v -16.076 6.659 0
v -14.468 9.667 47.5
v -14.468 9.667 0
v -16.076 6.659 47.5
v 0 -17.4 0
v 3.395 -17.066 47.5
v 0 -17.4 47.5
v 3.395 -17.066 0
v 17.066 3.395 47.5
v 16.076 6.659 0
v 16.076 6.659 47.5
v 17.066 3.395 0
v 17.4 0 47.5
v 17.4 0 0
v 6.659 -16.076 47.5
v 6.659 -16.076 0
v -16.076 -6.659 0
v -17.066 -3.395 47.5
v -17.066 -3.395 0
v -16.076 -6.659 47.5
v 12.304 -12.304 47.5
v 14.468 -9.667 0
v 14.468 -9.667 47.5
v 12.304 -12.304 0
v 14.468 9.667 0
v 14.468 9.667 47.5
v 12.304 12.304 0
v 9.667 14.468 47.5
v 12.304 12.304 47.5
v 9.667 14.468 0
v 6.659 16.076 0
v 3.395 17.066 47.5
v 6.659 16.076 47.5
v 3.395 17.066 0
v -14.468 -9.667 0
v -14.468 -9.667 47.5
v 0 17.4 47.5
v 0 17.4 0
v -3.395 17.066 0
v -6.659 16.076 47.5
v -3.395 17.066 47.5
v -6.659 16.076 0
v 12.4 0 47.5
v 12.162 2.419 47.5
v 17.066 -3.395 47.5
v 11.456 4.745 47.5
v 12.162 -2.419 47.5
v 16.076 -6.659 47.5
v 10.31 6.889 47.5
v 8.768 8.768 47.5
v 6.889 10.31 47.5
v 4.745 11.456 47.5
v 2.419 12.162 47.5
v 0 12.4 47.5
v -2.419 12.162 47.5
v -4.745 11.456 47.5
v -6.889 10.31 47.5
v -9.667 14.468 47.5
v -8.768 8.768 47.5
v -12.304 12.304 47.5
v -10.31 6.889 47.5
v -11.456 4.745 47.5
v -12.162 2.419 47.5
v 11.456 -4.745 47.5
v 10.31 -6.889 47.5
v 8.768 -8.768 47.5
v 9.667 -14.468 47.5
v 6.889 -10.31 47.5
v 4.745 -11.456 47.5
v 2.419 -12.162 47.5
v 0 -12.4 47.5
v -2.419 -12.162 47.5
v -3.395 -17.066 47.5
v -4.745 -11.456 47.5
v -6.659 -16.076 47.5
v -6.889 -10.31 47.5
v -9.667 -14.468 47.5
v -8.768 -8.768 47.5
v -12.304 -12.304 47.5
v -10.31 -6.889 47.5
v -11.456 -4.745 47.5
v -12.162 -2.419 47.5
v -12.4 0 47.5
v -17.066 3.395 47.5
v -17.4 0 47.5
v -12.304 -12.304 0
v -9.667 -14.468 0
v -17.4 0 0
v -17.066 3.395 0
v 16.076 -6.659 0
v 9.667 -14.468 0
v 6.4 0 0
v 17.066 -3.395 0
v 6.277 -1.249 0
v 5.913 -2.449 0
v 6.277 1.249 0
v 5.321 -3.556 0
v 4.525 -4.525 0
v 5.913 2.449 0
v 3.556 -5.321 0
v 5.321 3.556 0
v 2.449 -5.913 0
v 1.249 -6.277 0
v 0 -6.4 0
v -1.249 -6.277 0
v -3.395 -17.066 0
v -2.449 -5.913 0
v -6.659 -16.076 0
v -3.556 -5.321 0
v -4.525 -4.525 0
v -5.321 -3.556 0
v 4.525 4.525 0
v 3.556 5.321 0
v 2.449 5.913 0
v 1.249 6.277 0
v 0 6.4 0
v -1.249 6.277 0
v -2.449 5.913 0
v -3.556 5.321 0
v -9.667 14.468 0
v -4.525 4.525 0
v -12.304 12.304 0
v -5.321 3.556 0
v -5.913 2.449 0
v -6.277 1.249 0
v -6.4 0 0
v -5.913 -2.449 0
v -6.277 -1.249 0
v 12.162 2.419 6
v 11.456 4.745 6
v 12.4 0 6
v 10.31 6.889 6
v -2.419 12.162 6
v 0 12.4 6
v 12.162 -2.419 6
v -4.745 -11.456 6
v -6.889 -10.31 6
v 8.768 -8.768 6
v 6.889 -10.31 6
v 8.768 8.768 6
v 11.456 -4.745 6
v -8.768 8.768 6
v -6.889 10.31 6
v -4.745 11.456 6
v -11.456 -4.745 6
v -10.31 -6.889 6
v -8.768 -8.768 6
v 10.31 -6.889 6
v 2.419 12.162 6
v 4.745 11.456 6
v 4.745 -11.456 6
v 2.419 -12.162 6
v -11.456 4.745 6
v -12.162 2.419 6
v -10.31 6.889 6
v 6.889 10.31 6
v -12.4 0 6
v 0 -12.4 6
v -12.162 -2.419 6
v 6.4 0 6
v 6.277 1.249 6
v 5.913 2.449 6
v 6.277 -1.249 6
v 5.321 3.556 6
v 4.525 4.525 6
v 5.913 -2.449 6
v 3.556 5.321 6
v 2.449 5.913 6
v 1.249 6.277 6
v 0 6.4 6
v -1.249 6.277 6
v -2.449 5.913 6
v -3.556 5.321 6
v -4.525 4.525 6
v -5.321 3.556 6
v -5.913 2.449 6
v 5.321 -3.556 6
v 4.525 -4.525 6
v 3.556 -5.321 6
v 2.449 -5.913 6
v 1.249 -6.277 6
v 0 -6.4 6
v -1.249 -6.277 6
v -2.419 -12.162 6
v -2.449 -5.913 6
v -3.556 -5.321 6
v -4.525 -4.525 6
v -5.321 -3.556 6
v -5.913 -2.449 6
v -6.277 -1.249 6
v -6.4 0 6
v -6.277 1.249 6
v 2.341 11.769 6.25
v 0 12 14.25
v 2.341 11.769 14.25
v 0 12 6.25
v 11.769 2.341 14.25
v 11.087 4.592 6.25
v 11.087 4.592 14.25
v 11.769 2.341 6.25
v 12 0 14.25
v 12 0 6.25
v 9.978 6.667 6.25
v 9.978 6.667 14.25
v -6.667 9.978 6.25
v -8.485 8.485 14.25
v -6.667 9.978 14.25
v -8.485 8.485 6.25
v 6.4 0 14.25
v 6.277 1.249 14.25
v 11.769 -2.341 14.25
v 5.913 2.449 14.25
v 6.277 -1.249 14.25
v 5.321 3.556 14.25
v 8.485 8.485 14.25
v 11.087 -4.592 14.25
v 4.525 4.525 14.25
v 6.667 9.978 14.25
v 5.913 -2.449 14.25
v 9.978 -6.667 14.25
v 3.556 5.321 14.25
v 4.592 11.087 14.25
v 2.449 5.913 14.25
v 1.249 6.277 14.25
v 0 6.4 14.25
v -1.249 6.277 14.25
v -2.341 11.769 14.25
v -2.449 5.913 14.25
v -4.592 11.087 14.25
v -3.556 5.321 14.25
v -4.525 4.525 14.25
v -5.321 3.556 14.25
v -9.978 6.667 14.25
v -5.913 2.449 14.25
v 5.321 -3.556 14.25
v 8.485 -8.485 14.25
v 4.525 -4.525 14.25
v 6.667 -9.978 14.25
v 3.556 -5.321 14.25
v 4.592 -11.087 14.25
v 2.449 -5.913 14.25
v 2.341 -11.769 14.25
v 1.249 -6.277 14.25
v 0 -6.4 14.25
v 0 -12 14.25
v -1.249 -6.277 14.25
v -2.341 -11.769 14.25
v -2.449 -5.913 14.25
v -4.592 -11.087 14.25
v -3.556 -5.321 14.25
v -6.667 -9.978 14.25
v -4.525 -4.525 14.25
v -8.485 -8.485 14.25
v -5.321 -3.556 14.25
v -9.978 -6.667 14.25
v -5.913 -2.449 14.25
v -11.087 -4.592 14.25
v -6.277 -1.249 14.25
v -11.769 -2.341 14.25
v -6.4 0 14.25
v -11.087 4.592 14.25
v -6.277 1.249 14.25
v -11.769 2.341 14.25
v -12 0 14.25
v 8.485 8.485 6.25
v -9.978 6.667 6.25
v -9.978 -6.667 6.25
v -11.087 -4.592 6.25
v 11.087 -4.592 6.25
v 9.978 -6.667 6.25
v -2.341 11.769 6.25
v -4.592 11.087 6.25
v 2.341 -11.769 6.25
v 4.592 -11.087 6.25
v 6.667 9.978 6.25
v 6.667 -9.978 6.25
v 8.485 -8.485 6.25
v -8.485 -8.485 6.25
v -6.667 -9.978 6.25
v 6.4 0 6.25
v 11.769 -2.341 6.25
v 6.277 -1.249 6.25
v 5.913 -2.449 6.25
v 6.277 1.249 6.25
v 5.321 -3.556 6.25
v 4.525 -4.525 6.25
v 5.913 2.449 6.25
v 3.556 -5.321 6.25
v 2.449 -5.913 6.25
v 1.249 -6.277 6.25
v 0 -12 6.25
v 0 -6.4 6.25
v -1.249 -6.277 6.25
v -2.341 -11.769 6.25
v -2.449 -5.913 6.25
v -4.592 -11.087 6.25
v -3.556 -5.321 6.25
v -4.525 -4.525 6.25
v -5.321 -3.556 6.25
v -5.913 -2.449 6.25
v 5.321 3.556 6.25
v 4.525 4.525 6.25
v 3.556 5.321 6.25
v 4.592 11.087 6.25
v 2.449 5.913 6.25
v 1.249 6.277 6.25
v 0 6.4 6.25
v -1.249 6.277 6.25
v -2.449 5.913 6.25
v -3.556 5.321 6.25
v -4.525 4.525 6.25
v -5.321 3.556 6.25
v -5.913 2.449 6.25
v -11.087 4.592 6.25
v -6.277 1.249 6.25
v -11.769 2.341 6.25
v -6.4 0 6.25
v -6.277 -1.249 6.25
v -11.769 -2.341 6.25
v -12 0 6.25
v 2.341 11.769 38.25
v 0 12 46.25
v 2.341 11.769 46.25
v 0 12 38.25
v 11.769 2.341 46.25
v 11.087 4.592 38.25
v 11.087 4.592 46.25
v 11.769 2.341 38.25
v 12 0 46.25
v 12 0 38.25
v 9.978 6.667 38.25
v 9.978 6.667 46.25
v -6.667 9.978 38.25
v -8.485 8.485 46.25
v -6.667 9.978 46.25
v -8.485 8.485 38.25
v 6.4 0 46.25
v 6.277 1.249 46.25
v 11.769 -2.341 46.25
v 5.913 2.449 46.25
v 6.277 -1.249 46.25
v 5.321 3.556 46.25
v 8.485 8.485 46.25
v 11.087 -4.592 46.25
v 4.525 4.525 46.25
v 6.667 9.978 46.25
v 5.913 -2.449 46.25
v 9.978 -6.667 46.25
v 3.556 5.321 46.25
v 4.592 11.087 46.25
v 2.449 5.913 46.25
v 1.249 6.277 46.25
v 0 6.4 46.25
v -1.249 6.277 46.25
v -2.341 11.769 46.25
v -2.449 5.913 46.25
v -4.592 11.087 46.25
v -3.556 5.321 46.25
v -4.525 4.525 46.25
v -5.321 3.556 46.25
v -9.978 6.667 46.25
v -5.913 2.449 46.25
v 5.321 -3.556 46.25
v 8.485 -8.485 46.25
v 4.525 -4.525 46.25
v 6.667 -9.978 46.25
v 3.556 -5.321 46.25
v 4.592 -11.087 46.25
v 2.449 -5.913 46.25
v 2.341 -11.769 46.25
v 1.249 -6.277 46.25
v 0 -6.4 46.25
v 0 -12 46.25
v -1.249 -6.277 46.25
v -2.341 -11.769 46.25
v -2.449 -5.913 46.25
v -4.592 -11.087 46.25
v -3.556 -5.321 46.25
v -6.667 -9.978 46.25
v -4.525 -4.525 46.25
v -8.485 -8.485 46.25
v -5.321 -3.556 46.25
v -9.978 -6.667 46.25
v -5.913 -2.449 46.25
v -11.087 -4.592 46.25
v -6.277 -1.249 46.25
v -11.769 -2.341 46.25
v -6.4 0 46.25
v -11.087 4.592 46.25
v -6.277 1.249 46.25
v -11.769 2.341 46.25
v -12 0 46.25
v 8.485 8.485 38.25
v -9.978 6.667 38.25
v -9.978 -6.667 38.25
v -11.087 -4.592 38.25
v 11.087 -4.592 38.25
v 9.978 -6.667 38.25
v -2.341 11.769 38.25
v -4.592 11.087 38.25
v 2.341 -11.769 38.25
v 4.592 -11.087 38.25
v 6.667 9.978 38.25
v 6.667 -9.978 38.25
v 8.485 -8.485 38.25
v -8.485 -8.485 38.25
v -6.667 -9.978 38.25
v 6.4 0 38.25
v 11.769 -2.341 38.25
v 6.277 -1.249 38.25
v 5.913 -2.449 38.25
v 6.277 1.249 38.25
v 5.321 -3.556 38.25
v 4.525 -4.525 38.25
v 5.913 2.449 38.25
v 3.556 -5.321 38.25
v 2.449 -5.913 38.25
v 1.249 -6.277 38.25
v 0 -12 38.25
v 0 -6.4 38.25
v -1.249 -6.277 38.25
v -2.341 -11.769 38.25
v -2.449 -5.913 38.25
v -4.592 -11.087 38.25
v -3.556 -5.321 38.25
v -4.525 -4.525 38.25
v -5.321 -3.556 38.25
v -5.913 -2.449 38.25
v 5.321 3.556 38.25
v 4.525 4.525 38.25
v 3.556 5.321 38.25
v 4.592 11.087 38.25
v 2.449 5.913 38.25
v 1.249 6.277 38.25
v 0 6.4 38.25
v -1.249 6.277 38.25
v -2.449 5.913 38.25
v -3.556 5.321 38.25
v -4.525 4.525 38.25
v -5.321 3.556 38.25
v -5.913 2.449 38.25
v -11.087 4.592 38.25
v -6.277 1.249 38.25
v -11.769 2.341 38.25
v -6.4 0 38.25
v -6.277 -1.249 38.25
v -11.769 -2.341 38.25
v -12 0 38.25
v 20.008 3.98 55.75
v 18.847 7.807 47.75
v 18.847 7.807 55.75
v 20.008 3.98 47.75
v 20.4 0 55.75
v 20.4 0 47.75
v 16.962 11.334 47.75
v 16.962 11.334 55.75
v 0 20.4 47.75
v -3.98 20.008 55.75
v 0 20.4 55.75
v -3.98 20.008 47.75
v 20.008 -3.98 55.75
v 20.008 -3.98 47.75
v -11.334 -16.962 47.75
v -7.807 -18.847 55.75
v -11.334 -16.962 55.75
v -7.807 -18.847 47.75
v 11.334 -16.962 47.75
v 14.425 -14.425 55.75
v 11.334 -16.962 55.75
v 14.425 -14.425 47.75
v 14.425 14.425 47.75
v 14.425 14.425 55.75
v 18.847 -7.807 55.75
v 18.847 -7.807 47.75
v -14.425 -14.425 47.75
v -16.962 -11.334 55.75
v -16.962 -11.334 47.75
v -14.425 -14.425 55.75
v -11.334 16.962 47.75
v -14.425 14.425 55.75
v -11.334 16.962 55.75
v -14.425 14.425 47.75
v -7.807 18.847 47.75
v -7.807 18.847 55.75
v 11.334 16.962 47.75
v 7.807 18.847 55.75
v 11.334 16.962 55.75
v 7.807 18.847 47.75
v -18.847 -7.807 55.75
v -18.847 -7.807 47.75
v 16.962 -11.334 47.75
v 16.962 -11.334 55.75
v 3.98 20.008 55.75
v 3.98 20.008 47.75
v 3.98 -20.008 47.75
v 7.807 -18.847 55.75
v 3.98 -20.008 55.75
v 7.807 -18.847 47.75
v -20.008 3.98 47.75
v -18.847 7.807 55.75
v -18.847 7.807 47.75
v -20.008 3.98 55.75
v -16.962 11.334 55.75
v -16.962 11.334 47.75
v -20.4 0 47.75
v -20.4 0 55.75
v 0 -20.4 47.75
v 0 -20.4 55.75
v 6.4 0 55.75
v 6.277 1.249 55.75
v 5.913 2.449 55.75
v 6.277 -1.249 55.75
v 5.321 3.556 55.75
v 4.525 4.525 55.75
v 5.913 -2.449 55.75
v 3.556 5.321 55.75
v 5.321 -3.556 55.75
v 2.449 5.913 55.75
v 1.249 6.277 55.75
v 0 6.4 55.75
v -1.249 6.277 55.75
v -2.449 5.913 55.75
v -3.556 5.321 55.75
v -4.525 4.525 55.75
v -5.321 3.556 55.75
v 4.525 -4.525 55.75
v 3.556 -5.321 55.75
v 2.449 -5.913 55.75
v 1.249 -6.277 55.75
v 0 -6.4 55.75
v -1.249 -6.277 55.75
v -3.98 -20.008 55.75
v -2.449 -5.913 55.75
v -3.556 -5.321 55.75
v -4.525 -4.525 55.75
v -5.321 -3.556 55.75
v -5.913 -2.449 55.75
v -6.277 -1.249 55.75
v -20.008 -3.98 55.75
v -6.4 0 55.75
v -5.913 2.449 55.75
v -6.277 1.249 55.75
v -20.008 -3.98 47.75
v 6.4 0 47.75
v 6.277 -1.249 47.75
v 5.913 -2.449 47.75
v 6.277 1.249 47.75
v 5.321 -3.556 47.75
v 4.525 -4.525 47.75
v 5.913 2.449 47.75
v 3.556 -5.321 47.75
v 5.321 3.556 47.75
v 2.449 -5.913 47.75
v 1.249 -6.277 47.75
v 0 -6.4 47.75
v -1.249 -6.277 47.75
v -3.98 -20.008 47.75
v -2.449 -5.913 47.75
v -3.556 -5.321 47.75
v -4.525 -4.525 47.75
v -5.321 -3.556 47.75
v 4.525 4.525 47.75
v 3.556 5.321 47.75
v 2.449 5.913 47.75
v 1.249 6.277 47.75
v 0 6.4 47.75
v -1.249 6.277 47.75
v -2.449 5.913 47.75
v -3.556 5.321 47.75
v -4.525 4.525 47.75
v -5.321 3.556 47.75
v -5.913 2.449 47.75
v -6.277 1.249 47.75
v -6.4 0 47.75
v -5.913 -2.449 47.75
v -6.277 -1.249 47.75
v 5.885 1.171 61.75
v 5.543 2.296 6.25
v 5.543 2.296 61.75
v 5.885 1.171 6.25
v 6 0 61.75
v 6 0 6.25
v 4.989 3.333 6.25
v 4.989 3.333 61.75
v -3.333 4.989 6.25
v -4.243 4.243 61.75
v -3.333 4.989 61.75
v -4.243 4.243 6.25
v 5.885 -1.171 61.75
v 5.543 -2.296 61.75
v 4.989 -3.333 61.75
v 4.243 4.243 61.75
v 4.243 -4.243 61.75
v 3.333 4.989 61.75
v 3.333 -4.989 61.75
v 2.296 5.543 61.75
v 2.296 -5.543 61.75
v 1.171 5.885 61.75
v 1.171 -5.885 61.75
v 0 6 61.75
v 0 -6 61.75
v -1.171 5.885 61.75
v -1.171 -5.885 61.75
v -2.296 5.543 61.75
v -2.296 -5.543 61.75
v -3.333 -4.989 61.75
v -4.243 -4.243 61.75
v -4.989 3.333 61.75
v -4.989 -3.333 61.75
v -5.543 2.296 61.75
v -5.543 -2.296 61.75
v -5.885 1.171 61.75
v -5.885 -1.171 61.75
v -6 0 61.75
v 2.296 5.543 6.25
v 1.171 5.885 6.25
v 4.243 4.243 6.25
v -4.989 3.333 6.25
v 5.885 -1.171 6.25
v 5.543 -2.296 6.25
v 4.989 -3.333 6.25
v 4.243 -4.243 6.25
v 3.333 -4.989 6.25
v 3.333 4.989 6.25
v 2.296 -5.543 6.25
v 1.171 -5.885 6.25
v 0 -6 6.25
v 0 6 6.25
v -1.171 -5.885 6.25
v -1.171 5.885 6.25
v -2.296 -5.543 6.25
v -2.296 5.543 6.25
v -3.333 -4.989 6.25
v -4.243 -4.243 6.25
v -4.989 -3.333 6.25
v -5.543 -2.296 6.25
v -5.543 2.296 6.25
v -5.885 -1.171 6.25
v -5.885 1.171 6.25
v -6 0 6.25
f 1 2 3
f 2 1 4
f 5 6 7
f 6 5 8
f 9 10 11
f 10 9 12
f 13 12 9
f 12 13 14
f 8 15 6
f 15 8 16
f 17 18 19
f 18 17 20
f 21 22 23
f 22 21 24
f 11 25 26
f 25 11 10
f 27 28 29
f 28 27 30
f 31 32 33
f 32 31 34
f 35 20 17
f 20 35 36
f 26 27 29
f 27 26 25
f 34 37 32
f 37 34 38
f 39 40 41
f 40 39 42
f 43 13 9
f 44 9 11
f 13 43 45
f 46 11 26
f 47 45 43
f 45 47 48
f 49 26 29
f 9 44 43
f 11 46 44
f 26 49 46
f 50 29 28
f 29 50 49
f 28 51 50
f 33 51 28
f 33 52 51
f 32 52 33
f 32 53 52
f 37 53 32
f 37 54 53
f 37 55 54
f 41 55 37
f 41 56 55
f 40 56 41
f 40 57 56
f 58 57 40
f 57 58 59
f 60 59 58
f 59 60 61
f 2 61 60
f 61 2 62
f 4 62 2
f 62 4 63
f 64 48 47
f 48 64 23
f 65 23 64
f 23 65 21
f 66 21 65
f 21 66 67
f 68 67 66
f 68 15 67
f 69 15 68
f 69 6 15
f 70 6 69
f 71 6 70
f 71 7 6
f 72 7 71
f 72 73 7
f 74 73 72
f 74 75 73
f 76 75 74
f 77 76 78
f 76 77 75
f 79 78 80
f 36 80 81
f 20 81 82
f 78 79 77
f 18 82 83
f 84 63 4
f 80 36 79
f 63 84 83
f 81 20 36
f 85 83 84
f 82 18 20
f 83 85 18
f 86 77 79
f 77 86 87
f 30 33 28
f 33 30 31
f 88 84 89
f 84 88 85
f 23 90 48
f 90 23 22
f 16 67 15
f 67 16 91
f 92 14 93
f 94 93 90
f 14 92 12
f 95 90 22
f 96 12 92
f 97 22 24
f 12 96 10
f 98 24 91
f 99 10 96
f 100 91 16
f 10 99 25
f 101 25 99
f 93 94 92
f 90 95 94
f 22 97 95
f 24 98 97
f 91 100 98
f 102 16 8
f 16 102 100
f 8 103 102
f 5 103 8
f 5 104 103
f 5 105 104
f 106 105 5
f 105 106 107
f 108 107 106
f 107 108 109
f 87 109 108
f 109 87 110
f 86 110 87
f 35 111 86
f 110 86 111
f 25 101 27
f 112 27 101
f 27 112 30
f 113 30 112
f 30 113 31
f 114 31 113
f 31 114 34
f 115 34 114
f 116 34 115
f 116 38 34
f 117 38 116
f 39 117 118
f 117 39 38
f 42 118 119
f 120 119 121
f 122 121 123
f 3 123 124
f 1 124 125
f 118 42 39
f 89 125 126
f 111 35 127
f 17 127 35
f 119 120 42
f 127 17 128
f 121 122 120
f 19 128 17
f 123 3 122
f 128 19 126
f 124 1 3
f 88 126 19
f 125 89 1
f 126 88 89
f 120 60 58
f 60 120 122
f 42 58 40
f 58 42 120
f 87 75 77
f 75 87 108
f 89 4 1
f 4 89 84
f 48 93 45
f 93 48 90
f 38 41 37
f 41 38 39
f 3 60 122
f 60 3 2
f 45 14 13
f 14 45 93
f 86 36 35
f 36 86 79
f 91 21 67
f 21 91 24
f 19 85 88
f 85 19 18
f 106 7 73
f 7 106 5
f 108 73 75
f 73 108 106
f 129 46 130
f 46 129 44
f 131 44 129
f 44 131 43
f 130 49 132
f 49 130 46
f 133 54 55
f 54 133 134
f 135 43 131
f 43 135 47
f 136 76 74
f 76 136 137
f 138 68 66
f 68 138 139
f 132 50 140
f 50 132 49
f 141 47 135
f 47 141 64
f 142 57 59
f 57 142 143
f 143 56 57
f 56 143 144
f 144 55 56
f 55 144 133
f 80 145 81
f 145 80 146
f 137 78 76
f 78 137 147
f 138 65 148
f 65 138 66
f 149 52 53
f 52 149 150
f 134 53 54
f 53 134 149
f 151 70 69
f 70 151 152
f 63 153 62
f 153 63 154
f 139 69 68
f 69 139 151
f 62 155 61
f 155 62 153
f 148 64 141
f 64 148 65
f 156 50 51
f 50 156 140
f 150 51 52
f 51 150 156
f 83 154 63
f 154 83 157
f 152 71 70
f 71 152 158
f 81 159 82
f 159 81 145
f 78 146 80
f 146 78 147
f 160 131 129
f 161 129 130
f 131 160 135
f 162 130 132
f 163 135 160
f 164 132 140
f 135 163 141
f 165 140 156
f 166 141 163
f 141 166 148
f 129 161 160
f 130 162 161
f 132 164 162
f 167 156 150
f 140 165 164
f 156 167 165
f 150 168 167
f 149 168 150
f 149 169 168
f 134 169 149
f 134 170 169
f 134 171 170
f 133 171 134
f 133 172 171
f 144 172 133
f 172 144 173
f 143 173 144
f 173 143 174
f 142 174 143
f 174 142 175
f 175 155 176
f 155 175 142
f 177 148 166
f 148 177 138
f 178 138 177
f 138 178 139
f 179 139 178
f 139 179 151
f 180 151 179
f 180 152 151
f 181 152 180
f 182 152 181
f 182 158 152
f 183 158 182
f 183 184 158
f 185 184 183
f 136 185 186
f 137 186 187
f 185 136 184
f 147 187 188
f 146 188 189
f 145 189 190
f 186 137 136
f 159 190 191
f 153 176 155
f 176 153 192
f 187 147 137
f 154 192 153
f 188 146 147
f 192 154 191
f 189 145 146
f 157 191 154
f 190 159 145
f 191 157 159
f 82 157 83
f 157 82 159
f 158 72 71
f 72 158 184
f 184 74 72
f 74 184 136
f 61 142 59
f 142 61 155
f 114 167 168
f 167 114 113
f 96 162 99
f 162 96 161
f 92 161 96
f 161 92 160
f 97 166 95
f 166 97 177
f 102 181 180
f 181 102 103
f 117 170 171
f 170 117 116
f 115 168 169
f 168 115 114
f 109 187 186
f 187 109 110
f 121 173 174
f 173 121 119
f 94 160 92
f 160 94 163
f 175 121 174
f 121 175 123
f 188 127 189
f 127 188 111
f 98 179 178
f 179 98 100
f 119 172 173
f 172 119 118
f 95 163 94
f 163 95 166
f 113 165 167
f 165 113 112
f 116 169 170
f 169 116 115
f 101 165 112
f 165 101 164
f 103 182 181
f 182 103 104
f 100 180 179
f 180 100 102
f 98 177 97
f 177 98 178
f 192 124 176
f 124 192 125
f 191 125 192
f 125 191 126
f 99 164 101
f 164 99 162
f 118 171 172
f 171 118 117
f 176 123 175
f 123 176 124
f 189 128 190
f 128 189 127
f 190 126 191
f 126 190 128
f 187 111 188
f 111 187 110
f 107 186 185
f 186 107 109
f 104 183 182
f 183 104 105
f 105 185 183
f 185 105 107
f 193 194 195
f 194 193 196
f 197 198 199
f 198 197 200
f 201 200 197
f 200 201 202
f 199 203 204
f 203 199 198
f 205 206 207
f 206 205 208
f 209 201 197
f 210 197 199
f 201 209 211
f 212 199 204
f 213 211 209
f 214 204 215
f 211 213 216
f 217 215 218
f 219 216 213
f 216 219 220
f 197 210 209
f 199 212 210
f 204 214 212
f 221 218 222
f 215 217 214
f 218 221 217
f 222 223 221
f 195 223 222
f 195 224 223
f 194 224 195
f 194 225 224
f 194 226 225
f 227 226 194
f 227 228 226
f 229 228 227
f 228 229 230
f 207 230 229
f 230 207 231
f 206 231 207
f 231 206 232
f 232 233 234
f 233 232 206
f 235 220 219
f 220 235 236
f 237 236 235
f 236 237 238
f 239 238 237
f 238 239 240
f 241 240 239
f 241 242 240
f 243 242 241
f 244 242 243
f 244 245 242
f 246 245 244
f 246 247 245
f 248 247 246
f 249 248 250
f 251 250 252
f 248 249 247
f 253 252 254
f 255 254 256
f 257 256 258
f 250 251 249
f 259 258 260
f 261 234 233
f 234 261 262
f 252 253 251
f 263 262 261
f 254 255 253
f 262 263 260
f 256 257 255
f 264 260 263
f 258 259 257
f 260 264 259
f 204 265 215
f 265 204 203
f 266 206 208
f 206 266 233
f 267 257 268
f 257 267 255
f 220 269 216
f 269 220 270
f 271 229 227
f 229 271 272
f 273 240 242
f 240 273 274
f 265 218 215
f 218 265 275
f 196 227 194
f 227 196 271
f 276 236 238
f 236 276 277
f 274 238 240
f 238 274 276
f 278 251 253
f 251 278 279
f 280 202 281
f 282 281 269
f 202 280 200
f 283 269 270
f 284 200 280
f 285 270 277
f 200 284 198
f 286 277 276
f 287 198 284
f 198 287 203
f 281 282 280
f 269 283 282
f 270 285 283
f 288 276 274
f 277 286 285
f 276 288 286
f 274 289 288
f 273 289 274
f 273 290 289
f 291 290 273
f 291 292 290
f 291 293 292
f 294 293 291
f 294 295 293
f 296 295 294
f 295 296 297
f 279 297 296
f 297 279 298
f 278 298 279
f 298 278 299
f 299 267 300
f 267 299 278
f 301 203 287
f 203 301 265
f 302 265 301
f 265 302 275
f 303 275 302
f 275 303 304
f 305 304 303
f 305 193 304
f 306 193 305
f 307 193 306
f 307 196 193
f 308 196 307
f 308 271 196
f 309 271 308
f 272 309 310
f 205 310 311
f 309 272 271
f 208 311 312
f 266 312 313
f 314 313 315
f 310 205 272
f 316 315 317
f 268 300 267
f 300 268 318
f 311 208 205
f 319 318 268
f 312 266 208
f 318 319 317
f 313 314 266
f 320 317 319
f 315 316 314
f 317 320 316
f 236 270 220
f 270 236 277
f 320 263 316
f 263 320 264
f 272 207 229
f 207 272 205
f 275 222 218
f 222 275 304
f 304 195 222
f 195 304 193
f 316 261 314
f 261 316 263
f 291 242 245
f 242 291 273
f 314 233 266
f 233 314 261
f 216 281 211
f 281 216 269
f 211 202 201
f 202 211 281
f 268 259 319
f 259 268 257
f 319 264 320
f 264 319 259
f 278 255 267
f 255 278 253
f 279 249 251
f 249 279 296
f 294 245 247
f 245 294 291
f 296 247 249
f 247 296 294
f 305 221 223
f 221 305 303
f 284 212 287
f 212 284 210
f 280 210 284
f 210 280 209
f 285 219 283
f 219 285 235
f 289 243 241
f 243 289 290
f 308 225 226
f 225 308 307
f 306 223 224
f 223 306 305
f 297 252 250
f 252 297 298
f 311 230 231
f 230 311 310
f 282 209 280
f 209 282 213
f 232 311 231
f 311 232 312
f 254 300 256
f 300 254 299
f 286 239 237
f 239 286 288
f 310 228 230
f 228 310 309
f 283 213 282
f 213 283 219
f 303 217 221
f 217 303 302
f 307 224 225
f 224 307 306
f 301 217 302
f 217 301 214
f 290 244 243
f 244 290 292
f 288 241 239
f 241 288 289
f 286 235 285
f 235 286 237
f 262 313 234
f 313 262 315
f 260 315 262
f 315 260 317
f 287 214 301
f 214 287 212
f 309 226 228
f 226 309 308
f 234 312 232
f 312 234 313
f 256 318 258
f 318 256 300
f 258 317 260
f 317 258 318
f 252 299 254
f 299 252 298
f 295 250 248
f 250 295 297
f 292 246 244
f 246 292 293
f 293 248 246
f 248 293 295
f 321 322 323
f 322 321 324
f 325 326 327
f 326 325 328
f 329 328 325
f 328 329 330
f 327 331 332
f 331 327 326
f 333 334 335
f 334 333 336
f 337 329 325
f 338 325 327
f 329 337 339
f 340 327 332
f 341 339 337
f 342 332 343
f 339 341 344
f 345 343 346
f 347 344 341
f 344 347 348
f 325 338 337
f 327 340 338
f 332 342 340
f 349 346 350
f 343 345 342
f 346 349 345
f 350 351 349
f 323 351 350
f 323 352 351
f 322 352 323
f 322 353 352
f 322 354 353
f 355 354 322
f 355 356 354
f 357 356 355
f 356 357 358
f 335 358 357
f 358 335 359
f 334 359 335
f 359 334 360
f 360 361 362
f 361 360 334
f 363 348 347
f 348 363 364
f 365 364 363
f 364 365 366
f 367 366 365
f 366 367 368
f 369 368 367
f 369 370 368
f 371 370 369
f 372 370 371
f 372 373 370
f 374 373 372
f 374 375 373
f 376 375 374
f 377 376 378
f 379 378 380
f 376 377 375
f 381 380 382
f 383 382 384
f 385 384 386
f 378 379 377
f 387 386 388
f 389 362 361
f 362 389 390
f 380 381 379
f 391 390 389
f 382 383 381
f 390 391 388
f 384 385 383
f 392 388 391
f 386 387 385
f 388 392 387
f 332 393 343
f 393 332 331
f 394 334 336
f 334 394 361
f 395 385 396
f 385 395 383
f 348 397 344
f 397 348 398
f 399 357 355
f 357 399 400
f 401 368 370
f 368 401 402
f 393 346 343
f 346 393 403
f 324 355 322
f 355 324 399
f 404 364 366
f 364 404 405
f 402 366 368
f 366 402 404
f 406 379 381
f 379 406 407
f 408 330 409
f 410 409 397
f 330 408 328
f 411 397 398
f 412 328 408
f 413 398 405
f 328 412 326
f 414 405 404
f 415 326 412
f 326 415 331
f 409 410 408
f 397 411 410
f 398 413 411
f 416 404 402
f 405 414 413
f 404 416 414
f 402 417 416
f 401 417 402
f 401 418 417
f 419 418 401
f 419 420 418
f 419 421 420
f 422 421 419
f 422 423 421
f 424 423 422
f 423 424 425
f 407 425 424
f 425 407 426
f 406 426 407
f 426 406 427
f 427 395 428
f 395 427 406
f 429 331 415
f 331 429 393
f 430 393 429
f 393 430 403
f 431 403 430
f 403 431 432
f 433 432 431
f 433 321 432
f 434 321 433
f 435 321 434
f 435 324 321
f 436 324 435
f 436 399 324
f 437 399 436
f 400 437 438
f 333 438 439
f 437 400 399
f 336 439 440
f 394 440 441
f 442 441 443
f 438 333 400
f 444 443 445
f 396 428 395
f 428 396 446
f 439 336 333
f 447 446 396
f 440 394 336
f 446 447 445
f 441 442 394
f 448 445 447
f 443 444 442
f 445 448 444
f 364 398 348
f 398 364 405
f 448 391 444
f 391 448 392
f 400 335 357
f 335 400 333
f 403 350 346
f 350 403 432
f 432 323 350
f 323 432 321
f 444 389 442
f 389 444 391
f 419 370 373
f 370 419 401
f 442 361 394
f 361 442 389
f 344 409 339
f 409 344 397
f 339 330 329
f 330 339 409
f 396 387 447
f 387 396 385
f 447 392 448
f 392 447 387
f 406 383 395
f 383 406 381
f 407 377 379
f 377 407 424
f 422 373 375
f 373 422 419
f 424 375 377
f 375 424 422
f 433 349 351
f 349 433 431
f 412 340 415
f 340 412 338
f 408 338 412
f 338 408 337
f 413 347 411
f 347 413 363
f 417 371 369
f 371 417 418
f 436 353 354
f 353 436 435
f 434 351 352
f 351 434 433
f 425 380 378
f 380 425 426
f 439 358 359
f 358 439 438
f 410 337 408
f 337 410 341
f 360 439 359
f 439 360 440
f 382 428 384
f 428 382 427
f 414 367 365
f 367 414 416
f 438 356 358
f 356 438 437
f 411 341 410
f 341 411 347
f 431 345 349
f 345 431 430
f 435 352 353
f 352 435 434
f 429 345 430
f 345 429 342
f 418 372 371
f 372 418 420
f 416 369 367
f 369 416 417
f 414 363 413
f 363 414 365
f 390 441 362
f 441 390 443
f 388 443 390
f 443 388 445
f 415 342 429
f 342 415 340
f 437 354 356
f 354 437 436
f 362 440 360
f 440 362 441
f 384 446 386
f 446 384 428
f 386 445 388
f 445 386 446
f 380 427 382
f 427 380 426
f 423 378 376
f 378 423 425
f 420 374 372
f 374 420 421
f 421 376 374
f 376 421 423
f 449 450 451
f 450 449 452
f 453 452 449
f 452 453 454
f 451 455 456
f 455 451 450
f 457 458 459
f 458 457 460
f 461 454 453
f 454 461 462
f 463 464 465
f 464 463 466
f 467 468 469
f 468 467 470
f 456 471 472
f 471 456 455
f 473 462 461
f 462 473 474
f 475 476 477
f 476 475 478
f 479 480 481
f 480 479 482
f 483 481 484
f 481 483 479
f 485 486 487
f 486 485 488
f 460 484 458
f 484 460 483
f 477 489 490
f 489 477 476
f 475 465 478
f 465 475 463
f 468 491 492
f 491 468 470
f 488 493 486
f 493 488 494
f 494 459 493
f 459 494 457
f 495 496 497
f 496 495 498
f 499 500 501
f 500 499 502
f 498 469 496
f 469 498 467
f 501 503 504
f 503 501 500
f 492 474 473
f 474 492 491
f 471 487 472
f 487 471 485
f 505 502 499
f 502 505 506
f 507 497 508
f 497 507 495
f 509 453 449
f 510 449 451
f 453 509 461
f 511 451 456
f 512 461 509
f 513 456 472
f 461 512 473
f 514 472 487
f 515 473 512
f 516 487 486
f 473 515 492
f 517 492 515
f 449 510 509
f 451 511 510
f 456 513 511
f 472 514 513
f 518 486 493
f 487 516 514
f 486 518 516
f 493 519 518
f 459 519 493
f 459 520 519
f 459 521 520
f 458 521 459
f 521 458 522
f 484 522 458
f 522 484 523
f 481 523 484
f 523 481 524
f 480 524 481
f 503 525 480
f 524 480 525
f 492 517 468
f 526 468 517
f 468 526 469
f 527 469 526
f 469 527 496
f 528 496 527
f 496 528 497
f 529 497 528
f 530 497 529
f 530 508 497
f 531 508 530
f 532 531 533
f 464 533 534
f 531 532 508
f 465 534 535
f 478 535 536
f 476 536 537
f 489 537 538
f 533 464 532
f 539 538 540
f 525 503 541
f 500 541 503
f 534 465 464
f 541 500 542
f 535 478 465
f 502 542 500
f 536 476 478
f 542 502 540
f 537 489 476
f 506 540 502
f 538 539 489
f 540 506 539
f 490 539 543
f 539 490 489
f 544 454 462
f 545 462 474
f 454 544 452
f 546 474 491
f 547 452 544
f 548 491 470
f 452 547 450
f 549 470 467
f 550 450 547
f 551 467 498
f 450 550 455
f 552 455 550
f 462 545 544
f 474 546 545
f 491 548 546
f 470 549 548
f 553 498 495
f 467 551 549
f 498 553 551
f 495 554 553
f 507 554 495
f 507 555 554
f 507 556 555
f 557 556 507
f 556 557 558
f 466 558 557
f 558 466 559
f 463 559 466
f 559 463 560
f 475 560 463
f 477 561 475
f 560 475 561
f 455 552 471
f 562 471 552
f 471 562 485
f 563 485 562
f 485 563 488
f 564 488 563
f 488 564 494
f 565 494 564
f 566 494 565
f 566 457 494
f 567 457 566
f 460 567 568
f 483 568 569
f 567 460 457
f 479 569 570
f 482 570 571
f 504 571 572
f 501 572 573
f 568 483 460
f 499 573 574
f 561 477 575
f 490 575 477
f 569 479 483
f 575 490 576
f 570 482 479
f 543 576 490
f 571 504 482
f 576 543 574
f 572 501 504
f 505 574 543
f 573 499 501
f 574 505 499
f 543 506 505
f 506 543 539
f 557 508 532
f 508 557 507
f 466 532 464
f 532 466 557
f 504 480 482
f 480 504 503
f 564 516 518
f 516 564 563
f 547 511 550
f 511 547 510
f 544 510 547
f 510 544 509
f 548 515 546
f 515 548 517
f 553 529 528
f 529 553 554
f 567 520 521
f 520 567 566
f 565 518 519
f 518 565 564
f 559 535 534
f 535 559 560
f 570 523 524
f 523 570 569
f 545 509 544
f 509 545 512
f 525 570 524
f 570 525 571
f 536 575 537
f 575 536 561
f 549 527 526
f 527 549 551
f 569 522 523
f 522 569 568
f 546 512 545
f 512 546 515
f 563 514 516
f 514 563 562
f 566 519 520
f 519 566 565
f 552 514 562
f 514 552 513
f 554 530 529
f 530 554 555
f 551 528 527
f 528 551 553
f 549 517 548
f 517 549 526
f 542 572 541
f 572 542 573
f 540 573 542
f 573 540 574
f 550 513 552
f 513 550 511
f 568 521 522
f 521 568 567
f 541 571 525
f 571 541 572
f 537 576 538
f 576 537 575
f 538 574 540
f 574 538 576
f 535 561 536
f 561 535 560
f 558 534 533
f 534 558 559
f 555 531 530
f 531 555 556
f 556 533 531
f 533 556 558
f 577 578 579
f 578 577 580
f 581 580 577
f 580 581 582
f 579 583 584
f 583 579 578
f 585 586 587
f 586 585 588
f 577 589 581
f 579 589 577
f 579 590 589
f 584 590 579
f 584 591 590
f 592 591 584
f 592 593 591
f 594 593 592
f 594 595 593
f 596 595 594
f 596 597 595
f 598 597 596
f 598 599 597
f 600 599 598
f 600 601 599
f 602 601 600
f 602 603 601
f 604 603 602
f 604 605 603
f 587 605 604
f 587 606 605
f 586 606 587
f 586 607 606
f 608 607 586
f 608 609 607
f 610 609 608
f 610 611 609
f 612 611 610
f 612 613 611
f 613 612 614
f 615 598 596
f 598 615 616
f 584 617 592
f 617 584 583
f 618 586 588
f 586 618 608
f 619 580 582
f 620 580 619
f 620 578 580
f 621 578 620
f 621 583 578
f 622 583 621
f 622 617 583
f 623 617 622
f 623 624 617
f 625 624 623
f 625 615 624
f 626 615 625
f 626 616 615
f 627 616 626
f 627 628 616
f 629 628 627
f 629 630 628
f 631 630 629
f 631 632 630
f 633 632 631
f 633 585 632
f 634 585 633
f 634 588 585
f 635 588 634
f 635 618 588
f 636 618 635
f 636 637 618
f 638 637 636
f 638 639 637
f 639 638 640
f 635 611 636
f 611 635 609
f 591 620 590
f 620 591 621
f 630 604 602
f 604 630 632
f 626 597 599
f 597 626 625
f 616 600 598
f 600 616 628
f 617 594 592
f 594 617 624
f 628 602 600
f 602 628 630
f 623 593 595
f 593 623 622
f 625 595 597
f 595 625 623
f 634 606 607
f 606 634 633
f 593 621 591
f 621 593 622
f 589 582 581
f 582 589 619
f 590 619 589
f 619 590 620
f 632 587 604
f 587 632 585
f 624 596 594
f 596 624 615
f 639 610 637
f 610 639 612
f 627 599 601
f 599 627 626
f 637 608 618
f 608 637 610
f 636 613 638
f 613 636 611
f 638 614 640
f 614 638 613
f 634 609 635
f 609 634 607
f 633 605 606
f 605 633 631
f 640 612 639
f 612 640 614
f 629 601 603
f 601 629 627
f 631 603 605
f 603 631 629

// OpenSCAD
$fn = 32;

// ------------------------------------------------------------------------
// Shaft station: cup d34.8 x 47.5 mm, shaft d12
// Every part is its own module, assembly() places every instance.
// ------------------------------------------------------------------------

// --- part 1 ---
module housing_cup() {
  difference() {
    cylinder(h = 47.5, d = 34.8);
    translate([0, 0, 6]) cylinder(h = 42.5, d = 24.8);
    translate([0, 0, -1]) cylinder(h = 8, d = 12.8);
  }
}

// --- part 2 ---
module bearing_lower() {
  difference() {
      translate([0, 0, 0]) cylinder(h = 8, d = 24);
      translate([0, 0, -1]) cylinder(h = 10, d = 12.8);
    }
}

// --- part 3 ---
module bearing_upper() {
  difference() {
      translate([0, 0, 0]) cylinder(h = 8, d = 24);
      translate([0, 0, -1]) cylinder(h = 10, d = 12.8);
    }
}

// --- part 4 ---
module station_shaft() {
  translate([0, 0, -27.75]) cylinder(h = 55.5, d = 12);
}

// --- part 5 ---
module station_cover() {
  difference() {
    cylinder(h = 8, d = 40.8);
    translate([0, 0, -1]) cylinder(h = 10, d = 12.8);
  }
}

// --- assembly ---
module assembly() {
  color([0.80, 0.24, 0.20]) translate([0, 0, 0]) rotate([0, 0, 0]) housing_cup();
  color([0.20, 0.45, 0.75]) translate([0, 0, 6.25]) rotate([0, 0, 0]) bearing_lower();
  color([0.25, 0.62, 0.32]) translate([0, 0, 38.25]) rotate([0, 0, 0]) bearing_upper();
  color([0.92, 0.70, 0.18]) translate([0, 0, 34]) rotate([0, 0, 0]) station_shaft();
  color([0.58, 0.35, 0.70]) translate([0, 0, 47.75]) rotate([0, 0, 0]) station_cover();
}

assembly();
